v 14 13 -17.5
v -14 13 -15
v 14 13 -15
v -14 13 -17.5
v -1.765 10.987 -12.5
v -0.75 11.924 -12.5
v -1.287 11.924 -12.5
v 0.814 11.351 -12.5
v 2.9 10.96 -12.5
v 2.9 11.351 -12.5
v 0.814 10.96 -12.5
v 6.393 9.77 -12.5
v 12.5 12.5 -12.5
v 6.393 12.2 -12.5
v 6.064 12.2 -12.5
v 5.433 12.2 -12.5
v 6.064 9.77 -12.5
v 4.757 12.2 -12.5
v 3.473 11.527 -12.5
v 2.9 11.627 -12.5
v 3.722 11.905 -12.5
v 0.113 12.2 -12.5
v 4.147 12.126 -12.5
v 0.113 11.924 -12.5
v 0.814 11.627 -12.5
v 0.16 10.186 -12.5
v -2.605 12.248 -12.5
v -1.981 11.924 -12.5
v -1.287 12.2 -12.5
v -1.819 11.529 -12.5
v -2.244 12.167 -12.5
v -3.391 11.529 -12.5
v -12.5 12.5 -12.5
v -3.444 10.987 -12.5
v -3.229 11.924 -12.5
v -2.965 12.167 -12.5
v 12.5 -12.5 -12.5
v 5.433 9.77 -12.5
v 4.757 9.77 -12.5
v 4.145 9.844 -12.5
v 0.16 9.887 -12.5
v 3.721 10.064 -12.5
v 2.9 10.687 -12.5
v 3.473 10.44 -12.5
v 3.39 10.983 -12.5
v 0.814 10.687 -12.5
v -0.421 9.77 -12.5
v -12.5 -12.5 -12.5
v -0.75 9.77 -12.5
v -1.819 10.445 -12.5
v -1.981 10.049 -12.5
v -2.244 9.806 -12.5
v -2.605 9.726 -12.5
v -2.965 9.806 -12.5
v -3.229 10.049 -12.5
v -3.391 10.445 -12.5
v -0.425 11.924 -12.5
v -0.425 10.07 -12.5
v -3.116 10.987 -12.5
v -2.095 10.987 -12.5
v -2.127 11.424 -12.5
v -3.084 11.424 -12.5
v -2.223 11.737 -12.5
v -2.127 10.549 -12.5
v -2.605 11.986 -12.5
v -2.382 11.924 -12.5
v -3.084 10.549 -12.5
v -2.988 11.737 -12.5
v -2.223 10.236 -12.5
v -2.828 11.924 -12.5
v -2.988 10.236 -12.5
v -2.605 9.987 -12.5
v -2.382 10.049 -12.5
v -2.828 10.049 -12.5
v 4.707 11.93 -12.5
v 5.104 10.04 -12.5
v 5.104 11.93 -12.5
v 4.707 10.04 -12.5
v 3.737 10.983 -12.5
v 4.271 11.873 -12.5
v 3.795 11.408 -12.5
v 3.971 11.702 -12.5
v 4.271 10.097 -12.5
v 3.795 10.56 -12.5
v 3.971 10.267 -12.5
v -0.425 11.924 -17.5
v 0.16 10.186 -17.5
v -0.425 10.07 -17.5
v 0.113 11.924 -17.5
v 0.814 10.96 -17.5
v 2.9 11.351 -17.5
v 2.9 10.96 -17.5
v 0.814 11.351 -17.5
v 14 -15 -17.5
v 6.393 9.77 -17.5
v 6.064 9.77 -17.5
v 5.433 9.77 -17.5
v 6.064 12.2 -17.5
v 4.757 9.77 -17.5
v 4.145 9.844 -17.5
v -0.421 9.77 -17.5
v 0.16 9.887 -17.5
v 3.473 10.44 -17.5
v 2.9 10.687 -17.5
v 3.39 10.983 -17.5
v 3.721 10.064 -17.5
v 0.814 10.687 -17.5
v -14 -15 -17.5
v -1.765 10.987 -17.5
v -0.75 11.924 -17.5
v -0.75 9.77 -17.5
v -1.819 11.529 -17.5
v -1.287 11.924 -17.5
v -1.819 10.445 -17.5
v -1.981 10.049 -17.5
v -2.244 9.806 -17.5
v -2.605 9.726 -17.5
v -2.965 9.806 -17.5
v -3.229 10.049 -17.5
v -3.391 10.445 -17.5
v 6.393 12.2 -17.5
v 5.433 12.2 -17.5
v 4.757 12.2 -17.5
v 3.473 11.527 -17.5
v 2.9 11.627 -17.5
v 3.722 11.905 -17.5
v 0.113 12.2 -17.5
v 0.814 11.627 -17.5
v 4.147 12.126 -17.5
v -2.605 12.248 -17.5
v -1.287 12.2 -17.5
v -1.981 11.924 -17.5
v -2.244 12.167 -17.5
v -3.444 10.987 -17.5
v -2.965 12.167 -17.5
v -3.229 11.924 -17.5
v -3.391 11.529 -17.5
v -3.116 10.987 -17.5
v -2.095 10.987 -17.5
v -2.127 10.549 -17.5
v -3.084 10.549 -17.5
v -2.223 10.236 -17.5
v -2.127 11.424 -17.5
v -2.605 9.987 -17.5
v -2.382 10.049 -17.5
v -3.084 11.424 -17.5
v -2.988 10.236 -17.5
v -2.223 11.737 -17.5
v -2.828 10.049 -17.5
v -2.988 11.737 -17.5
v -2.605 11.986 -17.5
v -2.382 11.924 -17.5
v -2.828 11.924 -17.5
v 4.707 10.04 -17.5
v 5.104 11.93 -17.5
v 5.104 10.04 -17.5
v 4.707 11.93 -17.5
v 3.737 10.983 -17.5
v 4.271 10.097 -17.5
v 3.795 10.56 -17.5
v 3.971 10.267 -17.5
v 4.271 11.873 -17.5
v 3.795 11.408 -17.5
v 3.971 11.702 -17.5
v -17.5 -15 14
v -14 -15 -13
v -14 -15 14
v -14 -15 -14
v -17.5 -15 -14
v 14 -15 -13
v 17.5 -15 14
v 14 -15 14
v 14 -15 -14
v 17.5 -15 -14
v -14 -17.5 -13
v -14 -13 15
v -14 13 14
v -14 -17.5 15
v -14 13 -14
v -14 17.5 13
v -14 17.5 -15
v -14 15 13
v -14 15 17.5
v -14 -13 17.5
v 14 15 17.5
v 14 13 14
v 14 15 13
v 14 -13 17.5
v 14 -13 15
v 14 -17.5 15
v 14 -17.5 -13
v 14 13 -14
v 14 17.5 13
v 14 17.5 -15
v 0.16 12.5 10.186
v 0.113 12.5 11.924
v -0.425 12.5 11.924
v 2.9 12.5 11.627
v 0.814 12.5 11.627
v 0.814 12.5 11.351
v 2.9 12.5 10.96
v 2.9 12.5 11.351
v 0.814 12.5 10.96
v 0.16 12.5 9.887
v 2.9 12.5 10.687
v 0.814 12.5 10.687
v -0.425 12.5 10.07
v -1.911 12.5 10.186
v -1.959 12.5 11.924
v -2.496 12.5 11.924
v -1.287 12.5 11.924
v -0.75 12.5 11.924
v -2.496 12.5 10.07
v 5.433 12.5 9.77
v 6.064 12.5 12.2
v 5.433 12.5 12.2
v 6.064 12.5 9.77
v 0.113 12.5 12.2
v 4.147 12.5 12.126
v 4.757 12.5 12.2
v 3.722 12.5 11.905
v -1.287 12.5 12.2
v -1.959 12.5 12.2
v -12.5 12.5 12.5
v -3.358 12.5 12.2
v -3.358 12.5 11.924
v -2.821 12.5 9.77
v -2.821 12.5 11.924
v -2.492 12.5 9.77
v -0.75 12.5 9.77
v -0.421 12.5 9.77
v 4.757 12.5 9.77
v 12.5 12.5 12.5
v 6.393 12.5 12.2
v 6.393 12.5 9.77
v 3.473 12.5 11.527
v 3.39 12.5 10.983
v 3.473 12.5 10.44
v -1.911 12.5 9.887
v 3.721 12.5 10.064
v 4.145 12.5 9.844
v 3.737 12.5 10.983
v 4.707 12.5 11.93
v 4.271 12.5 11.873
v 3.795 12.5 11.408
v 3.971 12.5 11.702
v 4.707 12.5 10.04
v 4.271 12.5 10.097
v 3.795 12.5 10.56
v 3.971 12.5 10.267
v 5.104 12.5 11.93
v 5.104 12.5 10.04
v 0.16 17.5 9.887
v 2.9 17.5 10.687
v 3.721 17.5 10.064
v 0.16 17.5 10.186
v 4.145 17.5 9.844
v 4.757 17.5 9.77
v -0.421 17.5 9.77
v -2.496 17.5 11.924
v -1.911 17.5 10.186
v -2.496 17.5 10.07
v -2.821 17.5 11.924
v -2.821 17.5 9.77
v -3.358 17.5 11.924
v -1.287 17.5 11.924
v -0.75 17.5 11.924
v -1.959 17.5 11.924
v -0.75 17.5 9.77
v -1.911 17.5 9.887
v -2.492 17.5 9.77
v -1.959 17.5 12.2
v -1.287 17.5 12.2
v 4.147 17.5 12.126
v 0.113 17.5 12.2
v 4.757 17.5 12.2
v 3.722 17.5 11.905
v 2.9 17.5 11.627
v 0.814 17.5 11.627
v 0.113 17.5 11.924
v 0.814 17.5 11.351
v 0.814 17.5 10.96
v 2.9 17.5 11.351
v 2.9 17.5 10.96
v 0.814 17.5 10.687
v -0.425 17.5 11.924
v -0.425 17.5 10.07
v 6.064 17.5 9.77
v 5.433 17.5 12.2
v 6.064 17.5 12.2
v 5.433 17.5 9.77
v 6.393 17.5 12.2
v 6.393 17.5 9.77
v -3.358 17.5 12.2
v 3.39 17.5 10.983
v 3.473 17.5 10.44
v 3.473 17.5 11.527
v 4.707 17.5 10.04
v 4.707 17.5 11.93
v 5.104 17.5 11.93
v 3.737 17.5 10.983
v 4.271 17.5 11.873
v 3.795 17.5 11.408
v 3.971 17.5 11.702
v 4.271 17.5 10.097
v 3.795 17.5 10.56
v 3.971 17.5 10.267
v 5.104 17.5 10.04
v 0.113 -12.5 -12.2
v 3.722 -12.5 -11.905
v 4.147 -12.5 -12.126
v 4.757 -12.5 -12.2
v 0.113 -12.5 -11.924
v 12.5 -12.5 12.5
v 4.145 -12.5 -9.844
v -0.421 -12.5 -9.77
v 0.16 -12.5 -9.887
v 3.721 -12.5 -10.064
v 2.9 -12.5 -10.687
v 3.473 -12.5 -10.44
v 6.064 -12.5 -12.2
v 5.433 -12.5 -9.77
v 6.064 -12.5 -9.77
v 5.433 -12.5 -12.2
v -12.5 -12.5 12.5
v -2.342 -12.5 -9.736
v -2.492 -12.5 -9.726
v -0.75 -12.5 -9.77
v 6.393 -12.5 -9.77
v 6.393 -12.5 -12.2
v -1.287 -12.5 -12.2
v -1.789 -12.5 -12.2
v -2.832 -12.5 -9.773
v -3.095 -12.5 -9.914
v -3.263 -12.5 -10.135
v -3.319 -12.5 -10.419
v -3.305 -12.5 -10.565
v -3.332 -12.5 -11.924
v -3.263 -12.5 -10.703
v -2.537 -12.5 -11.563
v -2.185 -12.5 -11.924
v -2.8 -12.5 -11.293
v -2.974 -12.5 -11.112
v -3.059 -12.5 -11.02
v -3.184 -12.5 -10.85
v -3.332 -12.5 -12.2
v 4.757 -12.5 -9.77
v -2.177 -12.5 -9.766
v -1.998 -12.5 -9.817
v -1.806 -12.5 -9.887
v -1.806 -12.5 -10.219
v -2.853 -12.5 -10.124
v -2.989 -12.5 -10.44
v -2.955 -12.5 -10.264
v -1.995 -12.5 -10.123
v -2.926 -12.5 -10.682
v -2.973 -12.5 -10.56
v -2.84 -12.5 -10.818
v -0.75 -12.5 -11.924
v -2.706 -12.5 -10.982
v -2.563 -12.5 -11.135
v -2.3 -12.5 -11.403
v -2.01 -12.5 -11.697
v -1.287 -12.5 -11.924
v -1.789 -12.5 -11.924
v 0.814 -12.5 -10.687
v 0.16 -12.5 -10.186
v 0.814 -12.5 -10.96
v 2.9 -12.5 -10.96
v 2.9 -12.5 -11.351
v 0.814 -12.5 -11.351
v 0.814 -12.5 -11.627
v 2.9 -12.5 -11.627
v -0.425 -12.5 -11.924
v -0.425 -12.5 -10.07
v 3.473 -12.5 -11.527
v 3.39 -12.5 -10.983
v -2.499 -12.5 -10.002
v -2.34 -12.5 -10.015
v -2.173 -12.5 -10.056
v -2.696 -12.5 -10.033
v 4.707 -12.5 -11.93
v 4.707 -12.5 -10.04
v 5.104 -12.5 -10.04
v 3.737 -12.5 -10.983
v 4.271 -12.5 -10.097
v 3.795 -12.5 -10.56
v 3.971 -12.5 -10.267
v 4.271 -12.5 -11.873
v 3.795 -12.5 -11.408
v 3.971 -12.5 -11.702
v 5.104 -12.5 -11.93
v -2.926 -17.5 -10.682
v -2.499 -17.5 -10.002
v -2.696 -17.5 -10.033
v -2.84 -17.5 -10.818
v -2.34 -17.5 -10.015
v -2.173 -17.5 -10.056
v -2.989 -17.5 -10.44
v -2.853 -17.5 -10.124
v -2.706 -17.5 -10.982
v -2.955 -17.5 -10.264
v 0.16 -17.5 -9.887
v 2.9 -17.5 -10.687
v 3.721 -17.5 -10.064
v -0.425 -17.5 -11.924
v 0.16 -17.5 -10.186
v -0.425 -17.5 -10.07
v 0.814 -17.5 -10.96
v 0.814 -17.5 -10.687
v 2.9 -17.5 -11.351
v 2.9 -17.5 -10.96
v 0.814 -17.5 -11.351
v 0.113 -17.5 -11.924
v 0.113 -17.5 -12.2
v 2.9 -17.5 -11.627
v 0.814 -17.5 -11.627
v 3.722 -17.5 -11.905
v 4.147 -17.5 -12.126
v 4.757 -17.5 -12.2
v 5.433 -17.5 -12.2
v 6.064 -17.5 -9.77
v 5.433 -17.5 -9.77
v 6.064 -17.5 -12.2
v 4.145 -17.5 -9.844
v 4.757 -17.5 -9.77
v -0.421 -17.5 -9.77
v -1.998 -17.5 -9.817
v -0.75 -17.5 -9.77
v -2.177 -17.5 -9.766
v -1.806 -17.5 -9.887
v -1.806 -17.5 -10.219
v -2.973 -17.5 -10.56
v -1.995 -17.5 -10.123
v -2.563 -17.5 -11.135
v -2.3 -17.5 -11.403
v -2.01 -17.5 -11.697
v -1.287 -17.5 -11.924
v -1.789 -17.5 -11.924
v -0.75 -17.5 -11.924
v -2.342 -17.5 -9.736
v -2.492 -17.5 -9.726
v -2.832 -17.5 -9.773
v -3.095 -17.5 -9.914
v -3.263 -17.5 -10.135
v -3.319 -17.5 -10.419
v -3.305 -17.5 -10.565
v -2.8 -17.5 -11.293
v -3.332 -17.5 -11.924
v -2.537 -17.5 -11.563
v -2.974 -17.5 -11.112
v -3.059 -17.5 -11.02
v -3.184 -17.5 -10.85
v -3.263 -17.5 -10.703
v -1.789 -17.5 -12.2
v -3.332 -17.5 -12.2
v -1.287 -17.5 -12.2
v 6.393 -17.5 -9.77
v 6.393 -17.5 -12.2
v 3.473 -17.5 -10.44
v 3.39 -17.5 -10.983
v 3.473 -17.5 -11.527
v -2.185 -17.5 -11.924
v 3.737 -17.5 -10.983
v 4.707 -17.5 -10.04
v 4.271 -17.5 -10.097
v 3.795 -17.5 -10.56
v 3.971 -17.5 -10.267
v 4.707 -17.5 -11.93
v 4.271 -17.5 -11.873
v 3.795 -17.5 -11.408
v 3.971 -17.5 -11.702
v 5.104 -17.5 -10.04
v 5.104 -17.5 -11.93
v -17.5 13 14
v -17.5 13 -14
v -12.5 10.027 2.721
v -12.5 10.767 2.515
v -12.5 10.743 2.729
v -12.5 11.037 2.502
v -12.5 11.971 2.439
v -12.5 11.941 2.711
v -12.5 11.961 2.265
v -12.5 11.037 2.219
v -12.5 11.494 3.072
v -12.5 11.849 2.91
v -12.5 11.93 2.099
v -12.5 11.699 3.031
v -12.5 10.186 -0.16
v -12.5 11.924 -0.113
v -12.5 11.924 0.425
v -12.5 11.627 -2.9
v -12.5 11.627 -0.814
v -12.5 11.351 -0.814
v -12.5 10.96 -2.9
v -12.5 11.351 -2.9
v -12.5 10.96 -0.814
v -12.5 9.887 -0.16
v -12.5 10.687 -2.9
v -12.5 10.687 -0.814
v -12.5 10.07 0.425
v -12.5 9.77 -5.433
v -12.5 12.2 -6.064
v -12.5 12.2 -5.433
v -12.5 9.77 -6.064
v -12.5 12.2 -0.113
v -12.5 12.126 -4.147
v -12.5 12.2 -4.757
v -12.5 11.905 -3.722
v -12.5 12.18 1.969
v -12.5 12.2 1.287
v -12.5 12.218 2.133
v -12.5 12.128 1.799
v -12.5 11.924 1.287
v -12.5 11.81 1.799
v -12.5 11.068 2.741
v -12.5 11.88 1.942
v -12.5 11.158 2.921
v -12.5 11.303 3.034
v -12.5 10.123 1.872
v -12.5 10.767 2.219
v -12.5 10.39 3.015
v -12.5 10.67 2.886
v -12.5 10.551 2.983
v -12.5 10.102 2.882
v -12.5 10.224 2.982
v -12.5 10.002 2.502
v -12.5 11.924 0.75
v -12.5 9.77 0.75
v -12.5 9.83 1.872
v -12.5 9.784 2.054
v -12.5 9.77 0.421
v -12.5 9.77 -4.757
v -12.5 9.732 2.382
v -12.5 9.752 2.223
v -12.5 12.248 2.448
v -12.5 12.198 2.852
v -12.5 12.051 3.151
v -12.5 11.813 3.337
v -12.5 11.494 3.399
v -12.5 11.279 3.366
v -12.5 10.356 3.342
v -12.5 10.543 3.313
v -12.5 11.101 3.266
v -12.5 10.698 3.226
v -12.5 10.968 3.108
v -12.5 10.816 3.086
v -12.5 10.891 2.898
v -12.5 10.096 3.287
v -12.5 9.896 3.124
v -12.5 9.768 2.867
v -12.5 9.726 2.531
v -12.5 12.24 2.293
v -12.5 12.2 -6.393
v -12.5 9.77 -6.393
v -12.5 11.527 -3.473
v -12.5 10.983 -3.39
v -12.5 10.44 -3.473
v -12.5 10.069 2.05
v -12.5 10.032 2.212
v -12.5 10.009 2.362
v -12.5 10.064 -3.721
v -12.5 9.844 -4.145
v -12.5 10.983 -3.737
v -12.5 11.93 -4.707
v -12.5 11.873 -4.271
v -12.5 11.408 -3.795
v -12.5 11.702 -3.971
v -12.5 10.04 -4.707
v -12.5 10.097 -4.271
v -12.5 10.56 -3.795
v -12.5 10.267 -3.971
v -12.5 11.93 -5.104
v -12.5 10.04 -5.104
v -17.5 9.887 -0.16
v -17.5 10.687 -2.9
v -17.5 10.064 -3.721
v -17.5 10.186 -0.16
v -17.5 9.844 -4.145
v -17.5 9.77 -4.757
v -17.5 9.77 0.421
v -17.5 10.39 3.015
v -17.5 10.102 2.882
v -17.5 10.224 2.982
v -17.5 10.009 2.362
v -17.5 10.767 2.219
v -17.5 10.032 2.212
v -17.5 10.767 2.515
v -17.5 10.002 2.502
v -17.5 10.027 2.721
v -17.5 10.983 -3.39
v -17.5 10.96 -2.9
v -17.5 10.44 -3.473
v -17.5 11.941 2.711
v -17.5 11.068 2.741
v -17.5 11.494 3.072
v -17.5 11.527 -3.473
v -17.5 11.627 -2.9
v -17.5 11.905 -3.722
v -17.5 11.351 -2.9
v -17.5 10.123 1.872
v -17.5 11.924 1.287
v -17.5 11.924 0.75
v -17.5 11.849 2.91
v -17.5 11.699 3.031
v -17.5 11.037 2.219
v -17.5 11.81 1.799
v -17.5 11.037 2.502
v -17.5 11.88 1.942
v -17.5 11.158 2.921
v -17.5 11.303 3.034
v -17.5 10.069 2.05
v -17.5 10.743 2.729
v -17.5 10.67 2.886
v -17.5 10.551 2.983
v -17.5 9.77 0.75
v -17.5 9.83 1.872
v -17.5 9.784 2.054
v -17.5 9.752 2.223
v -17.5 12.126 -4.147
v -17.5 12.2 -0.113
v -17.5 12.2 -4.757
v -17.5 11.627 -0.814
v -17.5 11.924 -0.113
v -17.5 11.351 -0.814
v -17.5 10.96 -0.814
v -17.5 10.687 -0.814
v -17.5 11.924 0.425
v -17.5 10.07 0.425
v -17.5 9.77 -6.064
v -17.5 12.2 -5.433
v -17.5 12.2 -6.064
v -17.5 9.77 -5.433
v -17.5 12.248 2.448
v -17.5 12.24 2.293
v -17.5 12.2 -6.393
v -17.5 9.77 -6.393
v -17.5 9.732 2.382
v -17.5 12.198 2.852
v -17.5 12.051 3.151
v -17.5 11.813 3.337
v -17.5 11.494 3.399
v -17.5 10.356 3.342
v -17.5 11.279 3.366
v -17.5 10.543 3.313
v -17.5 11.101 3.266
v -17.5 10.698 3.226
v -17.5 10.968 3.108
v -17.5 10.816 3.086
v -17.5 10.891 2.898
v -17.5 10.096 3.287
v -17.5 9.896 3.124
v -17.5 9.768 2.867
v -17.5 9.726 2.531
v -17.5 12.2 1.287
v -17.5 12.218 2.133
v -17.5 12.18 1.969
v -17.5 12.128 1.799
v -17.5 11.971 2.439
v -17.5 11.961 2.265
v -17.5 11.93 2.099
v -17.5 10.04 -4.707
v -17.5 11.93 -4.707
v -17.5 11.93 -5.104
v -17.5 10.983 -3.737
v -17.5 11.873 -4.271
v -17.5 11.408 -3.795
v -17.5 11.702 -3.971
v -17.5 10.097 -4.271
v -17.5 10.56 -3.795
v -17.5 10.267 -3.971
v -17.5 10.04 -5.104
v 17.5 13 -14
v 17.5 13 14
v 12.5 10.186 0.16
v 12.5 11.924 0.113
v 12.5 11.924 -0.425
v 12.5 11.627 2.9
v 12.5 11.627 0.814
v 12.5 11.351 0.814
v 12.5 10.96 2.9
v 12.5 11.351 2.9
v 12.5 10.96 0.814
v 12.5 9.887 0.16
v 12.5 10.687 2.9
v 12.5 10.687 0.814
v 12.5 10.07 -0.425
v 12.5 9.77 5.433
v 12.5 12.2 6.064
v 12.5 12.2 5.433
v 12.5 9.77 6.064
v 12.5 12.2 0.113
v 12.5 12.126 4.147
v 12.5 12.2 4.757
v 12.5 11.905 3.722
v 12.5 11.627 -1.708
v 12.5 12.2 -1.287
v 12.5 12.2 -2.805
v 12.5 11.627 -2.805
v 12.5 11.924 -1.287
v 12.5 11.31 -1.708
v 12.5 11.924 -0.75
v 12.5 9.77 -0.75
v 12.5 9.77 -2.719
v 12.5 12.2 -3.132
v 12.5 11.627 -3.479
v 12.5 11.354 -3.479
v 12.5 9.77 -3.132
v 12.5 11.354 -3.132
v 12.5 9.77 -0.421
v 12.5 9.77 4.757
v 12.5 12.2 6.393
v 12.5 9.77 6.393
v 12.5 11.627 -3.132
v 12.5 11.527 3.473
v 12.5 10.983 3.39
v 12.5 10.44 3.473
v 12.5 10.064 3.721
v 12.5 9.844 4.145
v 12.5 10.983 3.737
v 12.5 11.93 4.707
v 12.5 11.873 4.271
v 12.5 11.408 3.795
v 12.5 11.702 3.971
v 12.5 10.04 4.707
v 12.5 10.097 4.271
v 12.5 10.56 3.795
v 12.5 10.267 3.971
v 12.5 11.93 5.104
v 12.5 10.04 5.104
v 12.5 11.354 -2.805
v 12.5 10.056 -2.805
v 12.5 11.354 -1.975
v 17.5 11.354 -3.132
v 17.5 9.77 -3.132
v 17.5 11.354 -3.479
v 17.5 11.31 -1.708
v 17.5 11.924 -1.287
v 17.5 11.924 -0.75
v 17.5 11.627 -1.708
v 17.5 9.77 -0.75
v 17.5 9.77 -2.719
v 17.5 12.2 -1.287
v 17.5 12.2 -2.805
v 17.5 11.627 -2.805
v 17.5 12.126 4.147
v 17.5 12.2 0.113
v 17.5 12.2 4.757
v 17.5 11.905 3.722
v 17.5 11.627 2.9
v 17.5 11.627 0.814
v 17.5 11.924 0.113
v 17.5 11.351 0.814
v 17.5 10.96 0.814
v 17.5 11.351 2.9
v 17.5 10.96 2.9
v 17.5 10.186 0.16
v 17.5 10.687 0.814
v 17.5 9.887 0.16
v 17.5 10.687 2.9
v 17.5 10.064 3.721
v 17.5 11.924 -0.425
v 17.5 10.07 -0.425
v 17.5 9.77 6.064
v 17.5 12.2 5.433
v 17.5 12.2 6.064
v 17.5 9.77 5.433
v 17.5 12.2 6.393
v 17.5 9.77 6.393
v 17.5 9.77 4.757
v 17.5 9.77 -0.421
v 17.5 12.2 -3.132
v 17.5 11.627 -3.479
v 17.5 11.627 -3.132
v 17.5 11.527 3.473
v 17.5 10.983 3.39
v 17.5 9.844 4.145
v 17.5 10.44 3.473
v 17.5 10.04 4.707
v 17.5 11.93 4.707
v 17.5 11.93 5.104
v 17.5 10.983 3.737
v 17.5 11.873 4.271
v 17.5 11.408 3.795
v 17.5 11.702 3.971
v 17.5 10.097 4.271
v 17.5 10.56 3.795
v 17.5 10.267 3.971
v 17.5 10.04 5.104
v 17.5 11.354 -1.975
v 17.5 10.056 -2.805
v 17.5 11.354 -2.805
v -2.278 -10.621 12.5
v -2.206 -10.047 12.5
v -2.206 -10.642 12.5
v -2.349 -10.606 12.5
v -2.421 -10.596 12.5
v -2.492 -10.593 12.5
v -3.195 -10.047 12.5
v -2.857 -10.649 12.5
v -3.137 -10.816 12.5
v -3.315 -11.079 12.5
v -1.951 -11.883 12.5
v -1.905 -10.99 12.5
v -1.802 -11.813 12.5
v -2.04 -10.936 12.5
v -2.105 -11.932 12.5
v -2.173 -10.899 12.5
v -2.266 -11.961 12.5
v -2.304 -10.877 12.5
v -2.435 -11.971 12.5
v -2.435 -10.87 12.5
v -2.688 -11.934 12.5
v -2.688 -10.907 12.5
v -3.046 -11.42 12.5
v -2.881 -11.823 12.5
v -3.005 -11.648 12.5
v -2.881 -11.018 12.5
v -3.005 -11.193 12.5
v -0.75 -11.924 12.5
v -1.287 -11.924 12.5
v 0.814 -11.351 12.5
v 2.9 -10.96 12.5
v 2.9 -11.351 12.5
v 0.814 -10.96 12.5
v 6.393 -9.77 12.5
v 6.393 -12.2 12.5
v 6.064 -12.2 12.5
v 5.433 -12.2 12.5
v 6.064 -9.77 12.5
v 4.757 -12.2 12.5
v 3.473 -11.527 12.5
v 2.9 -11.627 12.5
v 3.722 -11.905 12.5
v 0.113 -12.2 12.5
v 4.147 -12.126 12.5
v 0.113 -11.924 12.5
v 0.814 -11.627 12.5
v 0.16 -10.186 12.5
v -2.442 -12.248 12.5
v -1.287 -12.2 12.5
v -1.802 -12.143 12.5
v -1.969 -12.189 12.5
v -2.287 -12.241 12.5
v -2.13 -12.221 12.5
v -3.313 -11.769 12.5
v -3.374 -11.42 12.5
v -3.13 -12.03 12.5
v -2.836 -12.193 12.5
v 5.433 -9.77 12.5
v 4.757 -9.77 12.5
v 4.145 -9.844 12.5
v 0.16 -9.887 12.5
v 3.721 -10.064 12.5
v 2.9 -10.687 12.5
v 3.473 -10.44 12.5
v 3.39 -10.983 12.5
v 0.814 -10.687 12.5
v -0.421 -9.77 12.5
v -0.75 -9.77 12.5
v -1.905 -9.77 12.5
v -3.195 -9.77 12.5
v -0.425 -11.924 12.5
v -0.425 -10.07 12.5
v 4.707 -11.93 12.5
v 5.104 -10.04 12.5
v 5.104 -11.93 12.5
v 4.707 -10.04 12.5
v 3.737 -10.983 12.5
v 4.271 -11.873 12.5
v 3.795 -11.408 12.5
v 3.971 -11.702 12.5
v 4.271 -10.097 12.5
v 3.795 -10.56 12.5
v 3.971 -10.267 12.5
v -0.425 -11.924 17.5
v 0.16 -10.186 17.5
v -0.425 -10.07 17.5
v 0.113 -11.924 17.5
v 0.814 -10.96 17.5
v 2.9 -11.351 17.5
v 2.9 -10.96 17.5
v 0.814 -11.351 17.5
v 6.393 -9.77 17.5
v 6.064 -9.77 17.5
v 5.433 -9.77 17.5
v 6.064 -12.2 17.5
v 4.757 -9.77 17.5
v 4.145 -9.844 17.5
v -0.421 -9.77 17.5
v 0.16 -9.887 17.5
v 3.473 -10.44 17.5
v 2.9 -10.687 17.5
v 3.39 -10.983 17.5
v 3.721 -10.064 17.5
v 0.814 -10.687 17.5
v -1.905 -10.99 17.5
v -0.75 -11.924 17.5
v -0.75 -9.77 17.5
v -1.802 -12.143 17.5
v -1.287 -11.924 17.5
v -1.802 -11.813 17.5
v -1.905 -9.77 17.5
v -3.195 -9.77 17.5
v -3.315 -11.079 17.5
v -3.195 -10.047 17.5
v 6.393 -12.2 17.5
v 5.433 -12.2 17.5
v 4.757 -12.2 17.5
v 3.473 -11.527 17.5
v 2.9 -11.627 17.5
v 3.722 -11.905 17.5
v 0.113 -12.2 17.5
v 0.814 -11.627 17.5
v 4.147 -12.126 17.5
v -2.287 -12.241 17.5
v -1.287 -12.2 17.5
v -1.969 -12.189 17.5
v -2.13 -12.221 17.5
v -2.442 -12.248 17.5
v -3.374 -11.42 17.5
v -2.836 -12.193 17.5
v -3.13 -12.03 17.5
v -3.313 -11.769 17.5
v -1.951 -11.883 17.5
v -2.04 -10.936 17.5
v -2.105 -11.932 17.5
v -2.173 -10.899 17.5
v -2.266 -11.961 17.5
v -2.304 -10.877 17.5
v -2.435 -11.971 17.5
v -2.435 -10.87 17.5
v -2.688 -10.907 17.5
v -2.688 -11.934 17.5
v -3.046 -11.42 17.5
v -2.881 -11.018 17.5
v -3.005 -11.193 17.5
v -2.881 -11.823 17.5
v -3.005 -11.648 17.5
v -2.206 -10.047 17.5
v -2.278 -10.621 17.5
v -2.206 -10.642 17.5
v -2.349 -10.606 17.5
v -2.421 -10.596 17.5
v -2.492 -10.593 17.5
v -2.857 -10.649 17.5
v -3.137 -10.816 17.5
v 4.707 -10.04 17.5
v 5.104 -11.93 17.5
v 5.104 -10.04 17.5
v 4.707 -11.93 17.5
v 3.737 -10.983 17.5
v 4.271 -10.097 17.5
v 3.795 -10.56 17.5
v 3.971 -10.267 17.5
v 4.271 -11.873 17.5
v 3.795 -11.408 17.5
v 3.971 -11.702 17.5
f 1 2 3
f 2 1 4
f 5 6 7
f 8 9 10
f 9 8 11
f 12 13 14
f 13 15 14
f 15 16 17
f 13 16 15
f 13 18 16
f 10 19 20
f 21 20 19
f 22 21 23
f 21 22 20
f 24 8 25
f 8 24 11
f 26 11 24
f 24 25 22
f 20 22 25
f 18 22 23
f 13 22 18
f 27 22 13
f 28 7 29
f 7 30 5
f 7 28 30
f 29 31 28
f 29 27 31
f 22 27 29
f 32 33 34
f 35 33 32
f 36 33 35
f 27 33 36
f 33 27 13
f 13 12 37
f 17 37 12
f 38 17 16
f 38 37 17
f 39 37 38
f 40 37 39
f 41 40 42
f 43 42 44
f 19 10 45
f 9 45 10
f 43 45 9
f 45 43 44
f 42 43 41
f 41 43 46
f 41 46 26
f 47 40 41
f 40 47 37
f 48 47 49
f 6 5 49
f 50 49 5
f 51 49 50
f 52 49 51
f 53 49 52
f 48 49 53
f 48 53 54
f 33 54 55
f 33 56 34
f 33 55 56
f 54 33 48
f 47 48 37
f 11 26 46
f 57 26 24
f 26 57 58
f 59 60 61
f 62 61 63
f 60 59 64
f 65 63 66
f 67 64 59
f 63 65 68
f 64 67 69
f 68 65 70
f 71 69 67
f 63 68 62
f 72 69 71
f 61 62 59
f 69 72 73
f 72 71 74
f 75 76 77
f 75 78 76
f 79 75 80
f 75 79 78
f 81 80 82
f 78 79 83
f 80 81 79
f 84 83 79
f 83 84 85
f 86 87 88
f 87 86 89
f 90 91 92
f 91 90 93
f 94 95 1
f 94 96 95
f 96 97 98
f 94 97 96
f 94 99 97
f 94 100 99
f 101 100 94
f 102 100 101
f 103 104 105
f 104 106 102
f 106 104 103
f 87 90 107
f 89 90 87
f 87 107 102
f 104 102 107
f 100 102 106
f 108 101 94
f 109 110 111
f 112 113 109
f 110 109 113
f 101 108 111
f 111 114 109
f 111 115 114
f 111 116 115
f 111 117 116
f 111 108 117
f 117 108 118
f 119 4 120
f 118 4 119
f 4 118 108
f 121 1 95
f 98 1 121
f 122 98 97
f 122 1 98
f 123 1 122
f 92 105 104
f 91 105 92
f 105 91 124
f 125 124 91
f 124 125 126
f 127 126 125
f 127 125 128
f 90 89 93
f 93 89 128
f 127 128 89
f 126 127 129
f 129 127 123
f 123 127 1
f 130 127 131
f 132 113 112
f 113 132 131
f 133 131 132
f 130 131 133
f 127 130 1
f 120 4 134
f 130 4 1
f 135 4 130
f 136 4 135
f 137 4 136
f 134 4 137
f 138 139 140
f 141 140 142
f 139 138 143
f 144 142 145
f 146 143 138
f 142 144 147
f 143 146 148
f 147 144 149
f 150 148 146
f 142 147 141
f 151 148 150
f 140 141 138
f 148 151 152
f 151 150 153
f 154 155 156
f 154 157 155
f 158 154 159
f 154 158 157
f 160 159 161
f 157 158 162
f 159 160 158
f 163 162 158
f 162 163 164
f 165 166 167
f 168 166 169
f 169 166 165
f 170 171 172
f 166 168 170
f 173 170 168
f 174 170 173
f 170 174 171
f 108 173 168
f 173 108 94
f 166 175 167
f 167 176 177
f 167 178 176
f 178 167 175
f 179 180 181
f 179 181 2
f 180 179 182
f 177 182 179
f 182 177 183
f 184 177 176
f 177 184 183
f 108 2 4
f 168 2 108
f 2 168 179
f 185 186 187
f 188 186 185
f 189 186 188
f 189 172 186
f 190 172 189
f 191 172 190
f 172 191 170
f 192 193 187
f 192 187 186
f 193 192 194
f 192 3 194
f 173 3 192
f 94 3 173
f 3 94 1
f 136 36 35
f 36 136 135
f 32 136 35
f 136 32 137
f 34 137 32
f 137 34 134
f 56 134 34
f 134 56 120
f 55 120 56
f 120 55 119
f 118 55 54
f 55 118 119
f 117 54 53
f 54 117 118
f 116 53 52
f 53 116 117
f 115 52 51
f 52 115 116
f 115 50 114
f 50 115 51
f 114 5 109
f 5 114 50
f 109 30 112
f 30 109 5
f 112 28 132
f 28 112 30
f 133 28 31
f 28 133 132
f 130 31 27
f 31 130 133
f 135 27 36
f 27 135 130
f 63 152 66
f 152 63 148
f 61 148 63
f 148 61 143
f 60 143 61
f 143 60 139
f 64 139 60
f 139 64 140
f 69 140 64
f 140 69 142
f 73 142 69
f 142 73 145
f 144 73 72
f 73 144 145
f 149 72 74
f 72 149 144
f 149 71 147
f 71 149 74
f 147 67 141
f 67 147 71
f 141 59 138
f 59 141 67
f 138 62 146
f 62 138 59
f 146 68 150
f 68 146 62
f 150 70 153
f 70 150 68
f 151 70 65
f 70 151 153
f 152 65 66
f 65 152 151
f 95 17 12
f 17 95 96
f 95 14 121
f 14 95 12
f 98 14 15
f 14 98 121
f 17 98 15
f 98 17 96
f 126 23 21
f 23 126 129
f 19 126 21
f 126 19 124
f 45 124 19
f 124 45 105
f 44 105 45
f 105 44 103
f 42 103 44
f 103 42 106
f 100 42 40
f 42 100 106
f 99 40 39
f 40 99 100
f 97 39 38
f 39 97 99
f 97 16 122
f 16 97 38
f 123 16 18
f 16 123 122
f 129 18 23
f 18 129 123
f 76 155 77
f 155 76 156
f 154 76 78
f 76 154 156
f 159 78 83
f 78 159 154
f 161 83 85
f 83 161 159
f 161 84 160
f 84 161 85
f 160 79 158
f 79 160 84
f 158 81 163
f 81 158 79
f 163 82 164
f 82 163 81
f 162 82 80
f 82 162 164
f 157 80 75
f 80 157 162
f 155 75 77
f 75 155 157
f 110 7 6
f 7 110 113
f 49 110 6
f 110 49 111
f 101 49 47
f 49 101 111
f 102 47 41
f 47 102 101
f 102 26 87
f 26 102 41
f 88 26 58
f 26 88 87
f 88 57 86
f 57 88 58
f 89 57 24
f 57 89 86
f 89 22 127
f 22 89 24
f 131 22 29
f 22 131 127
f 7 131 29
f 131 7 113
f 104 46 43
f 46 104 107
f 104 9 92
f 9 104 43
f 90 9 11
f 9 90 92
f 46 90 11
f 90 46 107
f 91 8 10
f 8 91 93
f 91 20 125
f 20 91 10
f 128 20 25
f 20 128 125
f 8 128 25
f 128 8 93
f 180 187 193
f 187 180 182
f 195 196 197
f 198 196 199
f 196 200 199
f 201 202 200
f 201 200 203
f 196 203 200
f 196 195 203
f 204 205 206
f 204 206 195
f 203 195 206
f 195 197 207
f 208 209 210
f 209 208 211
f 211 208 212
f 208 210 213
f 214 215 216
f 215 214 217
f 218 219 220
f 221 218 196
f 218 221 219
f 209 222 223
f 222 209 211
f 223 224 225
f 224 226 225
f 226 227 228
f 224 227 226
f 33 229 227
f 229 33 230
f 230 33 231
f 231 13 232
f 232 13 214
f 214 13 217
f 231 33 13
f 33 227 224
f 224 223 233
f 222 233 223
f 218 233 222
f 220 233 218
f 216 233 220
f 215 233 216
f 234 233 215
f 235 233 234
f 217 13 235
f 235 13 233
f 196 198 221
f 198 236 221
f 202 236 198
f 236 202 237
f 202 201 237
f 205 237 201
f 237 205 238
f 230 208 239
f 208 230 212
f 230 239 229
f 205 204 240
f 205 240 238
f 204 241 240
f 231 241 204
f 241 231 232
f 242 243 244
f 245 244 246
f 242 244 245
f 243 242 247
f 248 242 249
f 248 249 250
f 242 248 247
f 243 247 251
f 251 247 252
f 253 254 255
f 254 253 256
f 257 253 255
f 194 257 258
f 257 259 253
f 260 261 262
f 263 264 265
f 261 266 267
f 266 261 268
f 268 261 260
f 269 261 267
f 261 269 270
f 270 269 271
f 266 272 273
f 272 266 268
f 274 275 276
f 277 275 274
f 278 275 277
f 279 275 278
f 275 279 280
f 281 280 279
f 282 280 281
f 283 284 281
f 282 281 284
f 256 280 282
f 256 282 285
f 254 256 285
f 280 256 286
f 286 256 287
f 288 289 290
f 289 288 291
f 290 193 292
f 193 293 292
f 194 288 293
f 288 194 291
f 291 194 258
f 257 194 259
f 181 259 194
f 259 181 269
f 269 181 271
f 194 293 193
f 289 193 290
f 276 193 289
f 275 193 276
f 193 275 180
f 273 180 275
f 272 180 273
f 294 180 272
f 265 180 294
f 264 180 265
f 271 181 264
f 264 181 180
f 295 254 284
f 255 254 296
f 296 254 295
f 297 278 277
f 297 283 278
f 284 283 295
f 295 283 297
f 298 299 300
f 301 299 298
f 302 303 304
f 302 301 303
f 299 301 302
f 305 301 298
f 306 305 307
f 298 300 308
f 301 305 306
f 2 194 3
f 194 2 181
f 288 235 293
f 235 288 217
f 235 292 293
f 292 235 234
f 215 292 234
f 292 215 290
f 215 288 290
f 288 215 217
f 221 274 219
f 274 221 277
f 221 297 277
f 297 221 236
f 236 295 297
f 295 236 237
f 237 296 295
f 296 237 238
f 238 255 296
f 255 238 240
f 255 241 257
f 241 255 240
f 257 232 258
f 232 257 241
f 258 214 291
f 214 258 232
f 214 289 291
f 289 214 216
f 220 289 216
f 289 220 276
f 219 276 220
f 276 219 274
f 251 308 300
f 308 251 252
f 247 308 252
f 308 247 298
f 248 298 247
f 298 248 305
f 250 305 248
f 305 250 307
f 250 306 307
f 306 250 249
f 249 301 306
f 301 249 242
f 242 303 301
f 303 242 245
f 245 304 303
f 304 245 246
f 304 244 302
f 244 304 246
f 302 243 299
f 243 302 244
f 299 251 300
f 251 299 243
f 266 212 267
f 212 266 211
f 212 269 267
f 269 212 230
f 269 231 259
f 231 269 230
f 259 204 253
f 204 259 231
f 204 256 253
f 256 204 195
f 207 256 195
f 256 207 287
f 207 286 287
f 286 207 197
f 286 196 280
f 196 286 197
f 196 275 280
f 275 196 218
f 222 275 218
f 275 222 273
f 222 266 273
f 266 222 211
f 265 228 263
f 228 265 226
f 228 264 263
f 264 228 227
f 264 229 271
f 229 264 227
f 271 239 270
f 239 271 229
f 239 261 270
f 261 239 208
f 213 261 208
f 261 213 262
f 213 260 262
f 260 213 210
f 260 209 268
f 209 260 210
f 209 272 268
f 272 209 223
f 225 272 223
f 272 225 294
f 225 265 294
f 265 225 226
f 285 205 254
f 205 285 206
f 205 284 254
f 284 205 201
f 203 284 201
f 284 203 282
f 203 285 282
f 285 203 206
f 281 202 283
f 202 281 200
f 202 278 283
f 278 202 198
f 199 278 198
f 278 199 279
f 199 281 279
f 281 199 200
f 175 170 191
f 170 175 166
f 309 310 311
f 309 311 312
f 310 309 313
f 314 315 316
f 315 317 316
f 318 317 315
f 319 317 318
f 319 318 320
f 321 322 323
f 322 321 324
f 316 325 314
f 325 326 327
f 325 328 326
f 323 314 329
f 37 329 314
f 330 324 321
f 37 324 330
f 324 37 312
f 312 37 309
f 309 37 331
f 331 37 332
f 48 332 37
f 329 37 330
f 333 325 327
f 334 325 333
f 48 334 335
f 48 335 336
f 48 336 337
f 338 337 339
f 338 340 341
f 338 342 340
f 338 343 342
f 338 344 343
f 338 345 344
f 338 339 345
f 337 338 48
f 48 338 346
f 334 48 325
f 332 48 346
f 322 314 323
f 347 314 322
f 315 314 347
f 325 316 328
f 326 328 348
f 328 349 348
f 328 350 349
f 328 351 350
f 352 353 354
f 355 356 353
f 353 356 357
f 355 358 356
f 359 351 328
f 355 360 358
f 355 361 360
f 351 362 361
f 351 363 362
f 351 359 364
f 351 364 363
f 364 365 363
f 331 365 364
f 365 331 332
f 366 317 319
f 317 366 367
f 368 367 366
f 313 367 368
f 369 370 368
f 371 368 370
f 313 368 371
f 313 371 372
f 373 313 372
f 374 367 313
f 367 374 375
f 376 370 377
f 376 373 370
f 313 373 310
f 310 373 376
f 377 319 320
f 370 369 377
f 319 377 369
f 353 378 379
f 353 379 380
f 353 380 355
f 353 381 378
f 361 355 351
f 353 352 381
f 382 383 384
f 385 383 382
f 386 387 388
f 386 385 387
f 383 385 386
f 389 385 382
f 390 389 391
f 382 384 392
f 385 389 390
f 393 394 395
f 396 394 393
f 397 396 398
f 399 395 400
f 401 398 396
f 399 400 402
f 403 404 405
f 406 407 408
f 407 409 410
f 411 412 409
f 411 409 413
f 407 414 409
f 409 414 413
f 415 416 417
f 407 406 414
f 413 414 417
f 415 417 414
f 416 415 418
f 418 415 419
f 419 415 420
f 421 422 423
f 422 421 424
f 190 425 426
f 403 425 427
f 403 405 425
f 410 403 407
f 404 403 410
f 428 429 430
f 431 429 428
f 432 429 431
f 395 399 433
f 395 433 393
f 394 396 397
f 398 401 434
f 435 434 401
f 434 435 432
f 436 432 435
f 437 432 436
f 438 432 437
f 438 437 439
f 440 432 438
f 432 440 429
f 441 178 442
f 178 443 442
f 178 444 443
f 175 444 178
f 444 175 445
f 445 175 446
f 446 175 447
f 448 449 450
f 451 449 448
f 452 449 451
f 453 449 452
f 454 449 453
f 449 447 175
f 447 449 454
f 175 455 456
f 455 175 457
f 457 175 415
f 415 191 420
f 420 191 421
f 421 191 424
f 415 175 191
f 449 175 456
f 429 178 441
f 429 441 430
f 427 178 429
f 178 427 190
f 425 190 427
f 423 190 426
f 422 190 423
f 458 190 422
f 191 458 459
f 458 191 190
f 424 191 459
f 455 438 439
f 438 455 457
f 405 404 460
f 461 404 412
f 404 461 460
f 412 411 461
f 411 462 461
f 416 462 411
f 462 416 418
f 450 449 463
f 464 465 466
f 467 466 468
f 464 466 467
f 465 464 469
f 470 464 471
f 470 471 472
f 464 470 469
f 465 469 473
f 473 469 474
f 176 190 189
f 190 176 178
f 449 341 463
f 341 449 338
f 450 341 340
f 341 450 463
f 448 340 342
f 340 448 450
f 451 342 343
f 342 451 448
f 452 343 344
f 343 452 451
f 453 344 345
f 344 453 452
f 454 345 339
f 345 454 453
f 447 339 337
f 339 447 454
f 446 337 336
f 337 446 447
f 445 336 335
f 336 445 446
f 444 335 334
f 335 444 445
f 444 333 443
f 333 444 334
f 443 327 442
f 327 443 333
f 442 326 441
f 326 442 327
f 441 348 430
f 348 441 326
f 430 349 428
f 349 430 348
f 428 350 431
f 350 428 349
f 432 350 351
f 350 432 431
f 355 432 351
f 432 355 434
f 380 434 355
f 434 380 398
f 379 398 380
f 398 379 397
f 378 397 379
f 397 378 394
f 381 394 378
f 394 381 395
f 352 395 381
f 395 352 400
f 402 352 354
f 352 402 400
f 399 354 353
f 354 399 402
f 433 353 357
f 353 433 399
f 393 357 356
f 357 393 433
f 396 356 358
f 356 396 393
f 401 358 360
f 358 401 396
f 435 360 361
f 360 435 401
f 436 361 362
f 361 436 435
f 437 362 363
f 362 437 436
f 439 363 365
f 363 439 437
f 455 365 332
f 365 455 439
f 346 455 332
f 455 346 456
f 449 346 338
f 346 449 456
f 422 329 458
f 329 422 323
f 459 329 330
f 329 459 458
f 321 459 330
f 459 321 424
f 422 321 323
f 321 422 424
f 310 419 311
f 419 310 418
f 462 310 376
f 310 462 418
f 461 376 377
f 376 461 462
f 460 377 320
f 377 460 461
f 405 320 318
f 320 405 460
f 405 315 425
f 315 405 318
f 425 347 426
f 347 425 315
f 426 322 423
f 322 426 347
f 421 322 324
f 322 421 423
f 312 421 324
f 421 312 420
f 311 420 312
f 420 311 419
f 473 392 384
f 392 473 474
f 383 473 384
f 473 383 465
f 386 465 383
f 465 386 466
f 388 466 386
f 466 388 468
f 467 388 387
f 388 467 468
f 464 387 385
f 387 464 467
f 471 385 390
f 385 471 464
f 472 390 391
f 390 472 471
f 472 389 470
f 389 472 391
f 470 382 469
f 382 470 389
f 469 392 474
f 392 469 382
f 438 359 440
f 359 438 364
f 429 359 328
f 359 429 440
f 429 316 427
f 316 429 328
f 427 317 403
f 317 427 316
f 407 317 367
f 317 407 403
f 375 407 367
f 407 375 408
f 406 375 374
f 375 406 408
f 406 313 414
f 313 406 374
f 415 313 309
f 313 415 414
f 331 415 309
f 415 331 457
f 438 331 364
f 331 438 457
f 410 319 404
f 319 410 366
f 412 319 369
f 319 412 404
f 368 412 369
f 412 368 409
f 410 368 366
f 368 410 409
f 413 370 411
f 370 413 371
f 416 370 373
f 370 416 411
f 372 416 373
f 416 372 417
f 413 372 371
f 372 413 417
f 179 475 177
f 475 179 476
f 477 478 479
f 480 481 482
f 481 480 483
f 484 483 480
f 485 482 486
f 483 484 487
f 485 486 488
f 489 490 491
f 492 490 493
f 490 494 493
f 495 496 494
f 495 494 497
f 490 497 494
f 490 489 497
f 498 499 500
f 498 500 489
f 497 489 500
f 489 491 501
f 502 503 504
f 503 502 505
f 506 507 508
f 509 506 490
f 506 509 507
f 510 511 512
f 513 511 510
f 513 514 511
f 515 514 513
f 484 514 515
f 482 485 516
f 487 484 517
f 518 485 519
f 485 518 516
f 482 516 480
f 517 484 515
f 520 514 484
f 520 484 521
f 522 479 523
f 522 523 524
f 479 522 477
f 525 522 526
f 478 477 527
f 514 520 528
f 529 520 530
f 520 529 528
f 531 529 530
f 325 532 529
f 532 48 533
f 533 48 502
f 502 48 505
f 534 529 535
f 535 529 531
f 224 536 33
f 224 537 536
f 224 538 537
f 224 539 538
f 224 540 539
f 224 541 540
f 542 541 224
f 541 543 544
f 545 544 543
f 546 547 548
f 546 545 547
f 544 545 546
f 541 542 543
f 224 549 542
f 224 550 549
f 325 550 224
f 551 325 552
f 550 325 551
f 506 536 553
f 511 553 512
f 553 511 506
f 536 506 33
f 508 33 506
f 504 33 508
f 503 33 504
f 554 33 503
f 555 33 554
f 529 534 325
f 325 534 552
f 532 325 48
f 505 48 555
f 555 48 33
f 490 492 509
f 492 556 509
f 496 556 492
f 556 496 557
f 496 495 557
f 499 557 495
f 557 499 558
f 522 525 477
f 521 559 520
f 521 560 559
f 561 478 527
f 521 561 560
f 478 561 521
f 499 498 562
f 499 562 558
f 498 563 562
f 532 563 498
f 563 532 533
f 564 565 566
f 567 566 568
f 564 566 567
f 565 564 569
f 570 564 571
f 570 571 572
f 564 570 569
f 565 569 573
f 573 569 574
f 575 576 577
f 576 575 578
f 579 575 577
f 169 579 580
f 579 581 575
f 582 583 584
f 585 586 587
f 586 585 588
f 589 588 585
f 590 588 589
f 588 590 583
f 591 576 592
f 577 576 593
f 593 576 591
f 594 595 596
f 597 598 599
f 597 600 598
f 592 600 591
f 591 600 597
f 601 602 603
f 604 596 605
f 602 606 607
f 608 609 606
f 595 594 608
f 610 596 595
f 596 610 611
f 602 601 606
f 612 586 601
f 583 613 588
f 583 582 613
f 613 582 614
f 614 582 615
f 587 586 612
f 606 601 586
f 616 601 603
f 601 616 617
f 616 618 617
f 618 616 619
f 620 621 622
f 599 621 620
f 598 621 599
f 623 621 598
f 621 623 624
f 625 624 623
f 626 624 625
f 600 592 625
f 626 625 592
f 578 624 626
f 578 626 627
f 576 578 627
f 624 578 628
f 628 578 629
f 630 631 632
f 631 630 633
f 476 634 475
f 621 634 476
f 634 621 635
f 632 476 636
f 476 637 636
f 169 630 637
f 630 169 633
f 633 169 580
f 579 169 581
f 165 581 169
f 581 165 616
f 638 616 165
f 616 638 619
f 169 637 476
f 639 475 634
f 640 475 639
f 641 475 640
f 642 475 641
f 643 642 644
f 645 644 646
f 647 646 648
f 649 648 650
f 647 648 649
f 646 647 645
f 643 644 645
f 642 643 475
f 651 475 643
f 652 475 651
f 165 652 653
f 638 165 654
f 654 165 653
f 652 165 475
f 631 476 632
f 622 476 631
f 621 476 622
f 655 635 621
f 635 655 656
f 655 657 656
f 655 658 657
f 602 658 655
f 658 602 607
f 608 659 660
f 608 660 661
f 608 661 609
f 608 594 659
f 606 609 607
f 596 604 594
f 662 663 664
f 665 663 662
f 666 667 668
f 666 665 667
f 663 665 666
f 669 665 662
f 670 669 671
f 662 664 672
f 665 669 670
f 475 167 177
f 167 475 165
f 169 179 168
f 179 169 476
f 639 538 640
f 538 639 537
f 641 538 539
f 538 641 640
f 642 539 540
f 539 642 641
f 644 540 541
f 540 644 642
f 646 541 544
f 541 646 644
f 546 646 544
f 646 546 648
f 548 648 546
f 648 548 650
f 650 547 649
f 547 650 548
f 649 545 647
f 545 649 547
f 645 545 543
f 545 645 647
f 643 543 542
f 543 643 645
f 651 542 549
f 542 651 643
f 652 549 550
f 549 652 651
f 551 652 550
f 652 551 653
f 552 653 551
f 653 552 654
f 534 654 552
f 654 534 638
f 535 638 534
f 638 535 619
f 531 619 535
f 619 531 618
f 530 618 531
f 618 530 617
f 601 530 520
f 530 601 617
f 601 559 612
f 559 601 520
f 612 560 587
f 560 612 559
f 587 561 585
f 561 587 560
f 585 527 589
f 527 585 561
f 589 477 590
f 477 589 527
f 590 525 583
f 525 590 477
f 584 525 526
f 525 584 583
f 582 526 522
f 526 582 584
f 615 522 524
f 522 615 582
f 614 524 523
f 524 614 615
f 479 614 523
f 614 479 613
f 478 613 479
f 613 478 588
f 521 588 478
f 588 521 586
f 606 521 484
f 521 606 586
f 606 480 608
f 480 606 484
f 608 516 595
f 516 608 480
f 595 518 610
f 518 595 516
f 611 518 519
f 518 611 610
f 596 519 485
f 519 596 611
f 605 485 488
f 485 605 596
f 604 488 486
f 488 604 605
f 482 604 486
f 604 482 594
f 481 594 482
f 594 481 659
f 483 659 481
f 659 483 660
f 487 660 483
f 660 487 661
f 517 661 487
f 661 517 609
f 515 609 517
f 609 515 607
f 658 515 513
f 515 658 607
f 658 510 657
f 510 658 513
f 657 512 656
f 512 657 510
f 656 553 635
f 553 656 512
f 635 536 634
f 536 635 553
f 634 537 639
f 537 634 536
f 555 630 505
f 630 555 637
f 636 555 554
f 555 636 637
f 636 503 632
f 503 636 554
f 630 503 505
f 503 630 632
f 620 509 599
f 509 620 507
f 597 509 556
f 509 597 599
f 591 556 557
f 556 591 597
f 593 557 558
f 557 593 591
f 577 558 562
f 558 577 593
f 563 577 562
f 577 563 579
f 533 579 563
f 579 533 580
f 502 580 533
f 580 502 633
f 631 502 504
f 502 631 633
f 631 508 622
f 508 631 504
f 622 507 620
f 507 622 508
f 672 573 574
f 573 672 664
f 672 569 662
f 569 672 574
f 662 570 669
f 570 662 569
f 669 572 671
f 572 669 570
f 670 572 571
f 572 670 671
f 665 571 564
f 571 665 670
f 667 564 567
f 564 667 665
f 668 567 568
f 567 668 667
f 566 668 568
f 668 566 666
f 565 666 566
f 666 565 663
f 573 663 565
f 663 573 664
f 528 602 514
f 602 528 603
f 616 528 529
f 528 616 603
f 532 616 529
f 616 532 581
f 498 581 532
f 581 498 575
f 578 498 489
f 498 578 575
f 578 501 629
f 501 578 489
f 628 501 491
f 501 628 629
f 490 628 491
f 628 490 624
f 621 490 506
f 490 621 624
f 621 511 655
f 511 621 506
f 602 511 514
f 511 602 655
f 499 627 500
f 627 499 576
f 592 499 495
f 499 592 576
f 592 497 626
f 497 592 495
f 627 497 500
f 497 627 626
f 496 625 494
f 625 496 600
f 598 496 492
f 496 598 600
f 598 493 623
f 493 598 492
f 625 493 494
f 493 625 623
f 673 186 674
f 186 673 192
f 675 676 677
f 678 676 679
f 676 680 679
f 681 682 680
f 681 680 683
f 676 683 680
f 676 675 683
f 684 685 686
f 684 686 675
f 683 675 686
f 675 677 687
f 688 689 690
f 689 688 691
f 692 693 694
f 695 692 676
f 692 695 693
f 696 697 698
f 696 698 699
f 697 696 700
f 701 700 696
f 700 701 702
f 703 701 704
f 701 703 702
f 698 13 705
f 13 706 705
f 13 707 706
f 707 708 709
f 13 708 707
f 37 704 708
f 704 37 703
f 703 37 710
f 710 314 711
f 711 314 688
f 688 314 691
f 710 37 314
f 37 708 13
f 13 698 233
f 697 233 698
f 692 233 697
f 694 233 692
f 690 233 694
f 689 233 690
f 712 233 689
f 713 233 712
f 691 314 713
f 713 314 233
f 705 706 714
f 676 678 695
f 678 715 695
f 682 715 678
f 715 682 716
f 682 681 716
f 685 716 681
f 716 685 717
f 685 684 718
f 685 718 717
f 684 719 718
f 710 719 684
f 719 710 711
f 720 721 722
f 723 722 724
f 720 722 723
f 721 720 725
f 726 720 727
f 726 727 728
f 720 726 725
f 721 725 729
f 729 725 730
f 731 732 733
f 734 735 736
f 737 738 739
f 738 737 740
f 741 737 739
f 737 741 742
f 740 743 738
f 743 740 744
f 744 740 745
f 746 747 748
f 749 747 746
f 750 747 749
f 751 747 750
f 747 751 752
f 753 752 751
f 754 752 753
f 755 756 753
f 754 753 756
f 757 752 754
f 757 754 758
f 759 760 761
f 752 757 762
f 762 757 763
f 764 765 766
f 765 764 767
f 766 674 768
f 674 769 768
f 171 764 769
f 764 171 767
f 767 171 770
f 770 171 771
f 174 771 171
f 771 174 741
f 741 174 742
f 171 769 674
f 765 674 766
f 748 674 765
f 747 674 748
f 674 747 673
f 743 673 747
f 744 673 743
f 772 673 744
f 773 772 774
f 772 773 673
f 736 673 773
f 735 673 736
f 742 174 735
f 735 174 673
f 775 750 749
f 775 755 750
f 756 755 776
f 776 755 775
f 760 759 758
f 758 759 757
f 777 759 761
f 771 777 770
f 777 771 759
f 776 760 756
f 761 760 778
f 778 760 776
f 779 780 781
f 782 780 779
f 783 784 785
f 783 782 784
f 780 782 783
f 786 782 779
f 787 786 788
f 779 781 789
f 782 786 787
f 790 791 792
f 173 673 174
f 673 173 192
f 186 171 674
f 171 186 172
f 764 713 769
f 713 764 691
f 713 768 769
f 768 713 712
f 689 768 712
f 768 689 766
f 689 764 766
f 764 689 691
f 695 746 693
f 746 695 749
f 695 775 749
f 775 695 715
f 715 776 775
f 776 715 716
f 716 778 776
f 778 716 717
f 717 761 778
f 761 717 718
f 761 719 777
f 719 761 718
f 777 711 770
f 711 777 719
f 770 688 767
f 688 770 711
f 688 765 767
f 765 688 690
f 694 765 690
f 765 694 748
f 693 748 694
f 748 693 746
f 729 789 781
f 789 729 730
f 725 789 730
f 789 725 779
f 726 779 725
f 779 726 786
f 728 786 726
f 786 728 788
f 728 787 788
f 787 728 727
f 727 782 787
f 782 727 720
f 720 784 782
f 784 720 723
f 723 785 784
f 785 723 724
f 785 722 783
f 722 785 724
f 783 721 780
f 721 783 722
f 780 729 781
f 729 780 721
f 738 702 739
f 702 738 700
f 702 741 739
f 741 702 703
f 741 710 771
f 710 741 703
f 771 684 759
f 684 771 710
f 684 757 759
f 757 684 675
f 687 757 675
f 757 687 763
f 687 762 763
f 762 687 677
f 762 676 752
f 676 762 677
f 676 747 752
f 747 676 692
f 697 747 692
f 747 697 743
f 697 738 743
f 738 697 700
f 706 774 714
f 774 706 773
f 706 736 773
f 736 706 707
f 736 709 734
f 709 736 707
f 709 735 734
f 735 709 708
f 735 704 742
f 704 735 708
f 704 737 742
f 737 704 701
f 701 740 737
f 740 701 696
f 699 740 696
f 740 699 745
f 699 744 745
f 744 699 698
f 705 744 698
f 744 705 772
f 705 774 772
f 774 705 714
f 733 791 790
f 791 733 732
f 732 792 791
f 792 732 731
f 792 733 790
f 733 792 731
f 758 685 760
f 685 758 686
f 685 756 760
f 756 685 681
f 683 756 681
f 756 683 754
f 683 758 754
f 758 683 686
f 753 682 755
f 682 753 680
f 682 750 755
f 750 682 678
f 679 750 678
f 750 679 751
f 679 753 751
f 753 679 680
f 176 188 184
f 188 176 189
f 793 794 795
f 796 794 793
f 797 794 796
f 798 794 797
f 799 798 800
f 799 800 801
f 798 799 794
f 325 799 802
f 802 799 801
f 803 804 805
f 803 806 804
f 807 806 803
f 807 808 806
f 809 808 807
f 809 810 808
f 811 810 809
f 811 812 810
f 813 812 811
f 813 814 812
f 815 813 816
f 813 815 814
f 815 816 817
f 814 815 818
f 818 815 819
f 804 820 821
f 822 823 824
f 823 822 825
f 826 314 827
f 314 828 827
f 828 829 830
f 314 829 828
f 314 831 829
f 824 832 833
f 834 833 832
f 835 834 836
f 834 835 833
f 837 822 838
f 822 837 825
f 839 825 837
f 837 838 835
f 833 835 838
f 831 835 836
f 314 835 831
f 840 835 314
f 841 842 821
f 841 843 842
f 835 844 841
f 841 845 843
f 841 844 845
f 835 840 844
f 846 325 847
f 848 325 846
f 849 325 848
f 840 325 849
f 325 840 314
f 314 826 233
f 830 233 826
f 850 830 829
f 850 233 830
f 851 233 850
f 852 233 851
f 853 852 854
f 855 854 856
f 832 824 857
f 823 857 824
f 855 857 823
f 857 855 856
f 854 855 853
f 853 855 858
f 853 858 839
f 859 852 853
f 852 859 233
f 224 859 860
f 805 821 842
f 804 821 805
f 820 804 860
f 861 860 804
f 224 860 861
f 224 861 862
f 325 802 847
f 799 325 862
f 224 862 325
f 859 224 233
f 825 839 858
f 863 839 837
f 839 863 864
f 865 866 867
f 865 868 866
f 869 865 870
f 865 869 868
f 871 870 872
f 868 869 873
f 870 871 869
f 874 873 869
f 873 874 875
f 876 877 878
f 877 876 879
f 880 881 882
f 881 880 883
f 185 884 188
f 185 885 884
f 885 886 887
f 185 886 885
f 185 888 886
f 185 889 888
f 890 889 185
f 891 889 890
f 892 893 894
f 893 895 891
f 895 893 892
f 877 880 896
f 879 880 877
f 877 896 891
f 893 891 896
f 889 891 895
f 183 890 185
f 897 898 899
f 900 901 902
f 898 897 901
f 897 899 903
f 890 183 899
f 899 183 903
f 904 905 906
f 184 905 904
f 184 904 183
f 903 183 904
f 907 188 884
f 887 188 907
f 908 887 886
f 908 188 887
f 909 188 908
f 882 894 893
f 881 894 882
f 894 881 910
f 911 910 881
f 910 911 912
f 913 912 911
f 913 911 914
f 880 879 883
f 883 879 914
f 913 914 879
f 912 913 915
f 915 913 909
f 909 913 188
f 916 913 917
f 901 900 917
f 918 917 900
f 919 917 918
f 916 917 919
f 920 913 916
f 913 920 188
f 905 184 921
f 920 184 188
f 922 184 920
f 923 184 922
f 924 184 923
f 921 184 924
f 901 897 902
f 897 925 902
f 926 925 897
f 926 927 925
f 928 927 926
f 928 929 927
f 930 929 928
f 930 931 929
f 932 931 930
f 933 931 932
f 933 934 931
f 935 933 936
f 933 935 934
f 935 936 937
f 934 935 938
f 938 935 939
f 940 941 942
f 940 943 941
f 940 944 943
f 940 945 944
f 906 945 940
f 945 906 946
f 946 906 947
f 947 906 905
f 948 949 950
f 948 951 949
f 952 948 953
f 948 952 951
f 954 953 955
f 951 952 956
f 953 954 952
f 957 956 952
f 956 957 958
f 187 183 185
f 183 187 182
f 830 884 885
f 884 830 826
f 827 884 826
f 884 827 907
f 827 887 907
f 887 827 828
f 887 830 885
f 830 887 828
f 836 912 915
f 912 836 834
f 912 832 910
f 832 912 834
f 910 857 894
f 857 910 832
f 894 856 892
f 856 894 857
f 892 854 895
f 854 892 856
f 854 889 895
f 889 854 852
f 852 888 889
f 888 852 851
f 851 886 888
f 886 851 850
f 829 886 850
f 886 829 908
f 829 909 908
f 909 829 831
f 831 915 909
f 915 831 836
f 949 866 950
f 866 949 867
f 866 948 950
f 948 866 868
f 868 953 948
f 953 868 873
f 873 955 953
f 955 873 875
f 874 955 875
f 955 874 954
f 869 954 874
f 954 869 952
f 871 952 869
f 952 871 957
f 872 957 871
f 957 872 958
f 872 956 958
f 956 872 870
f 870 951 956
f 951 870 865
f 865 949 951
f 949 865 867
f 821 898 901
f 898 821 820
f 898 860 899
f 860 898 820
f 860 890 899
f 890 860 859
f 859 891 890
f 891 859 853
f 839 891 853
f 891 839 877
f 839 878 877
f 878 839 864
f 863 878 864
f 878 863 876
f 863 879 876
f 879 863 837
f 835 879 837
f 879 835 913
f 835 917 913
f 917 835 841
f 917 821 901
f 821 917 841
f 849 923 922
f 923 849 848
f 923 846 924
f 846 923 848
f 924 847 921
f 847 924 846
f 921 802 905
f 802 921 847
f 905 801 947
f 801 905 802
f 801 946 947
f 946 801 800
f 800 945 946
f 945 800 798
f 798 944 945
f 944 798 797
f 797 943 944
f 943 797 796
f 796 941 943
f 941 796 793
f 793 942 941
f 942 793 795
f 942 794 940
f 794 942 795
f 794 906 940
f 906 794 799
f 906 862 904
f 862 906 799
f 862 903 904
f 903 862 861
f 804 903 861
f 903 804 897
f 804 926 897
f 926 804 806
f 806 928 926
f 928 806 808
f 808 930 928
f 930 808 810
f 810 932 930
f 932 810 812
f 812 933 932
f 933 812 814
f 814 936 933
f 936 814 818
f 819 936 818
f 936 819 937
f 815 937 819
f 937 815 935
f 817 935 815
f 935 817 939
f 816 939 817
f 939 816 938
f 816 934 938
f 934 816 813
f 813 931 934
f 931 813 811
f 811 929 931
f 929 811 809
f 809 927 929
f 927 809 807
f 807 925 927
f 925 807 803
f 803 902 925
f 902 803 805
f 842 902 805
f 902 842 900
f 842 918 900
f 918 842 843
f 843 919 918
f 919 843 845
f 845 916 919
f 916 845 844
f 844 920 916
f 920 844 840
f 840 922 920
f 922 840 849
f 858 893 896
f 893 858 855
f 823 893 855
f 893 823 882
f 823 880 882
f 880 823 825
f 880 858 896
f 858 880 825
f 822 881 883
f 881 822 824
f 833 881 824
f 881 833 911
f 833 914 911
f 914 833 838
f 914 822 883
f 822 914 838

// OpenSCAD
// file: modules.scad
zoom = [0.8,0.8,1];

module white( filename, text)
{
    scale(zoom)
    rotate([0,0,90]) 
    union(){ 
        translate([21.5,-8.4,-2.5])   rotate([0,0,90])  linear_extrude(5)  text (text,font="bold",size=3); 
        intersection() 
        {    
            cube([35,35,5],center=true); 
            translate([3,0,2.6])    scale([0.14,0.14,-1])  
            surface(file = filename, center = true); 
        } 
    } 

};

module black( filename, text)
{
    scale(zoom)
    rotate([0,0,90]) 
    difference() 
    {    
        translate([5,0,0])  cube([35,35,5],center=true); 
        translate([3,0,2.6])    scale([0.14,0.14,-1])  
        surface(file = filename, center = true);
        translate([21.5,-8.4,-2.5])   rotate([0,0,90])  linear_extrude(6)  text (text,font="bold",size=3);
    } 
}

module shape()
{
    scale(zoom)   rotate([0,0,90]) translate([5,0,0])  cube([35,35,5],center=true);  
}
// main file
include <modules.scad>

union() color([0,1,0])
{
    translate([0,-5,-15])                       black("../aruco/Marker10.png","ID=10");  
    rotate([90,0,0])    translate([0,-5,-15])   black("../aruco/Marker11.png","ID=11");  
    rotate([-90,0,0])    translate([0,-5,-15])  black("../aruco/Marker12.png","ID=12");  
    rotate([00,90,0])    translate([0,-5,-15])  black("../aruco/Marker13.png","ID=13");  
    rotate([00,-90,0])    translate([0,-5,-15]) black("../aruco/Marker14.png","ID=14");  
    rotate([180,0,0])    translate([0,-5,-15])  black("../aruco/Marker15.png","ID=15");  
}
